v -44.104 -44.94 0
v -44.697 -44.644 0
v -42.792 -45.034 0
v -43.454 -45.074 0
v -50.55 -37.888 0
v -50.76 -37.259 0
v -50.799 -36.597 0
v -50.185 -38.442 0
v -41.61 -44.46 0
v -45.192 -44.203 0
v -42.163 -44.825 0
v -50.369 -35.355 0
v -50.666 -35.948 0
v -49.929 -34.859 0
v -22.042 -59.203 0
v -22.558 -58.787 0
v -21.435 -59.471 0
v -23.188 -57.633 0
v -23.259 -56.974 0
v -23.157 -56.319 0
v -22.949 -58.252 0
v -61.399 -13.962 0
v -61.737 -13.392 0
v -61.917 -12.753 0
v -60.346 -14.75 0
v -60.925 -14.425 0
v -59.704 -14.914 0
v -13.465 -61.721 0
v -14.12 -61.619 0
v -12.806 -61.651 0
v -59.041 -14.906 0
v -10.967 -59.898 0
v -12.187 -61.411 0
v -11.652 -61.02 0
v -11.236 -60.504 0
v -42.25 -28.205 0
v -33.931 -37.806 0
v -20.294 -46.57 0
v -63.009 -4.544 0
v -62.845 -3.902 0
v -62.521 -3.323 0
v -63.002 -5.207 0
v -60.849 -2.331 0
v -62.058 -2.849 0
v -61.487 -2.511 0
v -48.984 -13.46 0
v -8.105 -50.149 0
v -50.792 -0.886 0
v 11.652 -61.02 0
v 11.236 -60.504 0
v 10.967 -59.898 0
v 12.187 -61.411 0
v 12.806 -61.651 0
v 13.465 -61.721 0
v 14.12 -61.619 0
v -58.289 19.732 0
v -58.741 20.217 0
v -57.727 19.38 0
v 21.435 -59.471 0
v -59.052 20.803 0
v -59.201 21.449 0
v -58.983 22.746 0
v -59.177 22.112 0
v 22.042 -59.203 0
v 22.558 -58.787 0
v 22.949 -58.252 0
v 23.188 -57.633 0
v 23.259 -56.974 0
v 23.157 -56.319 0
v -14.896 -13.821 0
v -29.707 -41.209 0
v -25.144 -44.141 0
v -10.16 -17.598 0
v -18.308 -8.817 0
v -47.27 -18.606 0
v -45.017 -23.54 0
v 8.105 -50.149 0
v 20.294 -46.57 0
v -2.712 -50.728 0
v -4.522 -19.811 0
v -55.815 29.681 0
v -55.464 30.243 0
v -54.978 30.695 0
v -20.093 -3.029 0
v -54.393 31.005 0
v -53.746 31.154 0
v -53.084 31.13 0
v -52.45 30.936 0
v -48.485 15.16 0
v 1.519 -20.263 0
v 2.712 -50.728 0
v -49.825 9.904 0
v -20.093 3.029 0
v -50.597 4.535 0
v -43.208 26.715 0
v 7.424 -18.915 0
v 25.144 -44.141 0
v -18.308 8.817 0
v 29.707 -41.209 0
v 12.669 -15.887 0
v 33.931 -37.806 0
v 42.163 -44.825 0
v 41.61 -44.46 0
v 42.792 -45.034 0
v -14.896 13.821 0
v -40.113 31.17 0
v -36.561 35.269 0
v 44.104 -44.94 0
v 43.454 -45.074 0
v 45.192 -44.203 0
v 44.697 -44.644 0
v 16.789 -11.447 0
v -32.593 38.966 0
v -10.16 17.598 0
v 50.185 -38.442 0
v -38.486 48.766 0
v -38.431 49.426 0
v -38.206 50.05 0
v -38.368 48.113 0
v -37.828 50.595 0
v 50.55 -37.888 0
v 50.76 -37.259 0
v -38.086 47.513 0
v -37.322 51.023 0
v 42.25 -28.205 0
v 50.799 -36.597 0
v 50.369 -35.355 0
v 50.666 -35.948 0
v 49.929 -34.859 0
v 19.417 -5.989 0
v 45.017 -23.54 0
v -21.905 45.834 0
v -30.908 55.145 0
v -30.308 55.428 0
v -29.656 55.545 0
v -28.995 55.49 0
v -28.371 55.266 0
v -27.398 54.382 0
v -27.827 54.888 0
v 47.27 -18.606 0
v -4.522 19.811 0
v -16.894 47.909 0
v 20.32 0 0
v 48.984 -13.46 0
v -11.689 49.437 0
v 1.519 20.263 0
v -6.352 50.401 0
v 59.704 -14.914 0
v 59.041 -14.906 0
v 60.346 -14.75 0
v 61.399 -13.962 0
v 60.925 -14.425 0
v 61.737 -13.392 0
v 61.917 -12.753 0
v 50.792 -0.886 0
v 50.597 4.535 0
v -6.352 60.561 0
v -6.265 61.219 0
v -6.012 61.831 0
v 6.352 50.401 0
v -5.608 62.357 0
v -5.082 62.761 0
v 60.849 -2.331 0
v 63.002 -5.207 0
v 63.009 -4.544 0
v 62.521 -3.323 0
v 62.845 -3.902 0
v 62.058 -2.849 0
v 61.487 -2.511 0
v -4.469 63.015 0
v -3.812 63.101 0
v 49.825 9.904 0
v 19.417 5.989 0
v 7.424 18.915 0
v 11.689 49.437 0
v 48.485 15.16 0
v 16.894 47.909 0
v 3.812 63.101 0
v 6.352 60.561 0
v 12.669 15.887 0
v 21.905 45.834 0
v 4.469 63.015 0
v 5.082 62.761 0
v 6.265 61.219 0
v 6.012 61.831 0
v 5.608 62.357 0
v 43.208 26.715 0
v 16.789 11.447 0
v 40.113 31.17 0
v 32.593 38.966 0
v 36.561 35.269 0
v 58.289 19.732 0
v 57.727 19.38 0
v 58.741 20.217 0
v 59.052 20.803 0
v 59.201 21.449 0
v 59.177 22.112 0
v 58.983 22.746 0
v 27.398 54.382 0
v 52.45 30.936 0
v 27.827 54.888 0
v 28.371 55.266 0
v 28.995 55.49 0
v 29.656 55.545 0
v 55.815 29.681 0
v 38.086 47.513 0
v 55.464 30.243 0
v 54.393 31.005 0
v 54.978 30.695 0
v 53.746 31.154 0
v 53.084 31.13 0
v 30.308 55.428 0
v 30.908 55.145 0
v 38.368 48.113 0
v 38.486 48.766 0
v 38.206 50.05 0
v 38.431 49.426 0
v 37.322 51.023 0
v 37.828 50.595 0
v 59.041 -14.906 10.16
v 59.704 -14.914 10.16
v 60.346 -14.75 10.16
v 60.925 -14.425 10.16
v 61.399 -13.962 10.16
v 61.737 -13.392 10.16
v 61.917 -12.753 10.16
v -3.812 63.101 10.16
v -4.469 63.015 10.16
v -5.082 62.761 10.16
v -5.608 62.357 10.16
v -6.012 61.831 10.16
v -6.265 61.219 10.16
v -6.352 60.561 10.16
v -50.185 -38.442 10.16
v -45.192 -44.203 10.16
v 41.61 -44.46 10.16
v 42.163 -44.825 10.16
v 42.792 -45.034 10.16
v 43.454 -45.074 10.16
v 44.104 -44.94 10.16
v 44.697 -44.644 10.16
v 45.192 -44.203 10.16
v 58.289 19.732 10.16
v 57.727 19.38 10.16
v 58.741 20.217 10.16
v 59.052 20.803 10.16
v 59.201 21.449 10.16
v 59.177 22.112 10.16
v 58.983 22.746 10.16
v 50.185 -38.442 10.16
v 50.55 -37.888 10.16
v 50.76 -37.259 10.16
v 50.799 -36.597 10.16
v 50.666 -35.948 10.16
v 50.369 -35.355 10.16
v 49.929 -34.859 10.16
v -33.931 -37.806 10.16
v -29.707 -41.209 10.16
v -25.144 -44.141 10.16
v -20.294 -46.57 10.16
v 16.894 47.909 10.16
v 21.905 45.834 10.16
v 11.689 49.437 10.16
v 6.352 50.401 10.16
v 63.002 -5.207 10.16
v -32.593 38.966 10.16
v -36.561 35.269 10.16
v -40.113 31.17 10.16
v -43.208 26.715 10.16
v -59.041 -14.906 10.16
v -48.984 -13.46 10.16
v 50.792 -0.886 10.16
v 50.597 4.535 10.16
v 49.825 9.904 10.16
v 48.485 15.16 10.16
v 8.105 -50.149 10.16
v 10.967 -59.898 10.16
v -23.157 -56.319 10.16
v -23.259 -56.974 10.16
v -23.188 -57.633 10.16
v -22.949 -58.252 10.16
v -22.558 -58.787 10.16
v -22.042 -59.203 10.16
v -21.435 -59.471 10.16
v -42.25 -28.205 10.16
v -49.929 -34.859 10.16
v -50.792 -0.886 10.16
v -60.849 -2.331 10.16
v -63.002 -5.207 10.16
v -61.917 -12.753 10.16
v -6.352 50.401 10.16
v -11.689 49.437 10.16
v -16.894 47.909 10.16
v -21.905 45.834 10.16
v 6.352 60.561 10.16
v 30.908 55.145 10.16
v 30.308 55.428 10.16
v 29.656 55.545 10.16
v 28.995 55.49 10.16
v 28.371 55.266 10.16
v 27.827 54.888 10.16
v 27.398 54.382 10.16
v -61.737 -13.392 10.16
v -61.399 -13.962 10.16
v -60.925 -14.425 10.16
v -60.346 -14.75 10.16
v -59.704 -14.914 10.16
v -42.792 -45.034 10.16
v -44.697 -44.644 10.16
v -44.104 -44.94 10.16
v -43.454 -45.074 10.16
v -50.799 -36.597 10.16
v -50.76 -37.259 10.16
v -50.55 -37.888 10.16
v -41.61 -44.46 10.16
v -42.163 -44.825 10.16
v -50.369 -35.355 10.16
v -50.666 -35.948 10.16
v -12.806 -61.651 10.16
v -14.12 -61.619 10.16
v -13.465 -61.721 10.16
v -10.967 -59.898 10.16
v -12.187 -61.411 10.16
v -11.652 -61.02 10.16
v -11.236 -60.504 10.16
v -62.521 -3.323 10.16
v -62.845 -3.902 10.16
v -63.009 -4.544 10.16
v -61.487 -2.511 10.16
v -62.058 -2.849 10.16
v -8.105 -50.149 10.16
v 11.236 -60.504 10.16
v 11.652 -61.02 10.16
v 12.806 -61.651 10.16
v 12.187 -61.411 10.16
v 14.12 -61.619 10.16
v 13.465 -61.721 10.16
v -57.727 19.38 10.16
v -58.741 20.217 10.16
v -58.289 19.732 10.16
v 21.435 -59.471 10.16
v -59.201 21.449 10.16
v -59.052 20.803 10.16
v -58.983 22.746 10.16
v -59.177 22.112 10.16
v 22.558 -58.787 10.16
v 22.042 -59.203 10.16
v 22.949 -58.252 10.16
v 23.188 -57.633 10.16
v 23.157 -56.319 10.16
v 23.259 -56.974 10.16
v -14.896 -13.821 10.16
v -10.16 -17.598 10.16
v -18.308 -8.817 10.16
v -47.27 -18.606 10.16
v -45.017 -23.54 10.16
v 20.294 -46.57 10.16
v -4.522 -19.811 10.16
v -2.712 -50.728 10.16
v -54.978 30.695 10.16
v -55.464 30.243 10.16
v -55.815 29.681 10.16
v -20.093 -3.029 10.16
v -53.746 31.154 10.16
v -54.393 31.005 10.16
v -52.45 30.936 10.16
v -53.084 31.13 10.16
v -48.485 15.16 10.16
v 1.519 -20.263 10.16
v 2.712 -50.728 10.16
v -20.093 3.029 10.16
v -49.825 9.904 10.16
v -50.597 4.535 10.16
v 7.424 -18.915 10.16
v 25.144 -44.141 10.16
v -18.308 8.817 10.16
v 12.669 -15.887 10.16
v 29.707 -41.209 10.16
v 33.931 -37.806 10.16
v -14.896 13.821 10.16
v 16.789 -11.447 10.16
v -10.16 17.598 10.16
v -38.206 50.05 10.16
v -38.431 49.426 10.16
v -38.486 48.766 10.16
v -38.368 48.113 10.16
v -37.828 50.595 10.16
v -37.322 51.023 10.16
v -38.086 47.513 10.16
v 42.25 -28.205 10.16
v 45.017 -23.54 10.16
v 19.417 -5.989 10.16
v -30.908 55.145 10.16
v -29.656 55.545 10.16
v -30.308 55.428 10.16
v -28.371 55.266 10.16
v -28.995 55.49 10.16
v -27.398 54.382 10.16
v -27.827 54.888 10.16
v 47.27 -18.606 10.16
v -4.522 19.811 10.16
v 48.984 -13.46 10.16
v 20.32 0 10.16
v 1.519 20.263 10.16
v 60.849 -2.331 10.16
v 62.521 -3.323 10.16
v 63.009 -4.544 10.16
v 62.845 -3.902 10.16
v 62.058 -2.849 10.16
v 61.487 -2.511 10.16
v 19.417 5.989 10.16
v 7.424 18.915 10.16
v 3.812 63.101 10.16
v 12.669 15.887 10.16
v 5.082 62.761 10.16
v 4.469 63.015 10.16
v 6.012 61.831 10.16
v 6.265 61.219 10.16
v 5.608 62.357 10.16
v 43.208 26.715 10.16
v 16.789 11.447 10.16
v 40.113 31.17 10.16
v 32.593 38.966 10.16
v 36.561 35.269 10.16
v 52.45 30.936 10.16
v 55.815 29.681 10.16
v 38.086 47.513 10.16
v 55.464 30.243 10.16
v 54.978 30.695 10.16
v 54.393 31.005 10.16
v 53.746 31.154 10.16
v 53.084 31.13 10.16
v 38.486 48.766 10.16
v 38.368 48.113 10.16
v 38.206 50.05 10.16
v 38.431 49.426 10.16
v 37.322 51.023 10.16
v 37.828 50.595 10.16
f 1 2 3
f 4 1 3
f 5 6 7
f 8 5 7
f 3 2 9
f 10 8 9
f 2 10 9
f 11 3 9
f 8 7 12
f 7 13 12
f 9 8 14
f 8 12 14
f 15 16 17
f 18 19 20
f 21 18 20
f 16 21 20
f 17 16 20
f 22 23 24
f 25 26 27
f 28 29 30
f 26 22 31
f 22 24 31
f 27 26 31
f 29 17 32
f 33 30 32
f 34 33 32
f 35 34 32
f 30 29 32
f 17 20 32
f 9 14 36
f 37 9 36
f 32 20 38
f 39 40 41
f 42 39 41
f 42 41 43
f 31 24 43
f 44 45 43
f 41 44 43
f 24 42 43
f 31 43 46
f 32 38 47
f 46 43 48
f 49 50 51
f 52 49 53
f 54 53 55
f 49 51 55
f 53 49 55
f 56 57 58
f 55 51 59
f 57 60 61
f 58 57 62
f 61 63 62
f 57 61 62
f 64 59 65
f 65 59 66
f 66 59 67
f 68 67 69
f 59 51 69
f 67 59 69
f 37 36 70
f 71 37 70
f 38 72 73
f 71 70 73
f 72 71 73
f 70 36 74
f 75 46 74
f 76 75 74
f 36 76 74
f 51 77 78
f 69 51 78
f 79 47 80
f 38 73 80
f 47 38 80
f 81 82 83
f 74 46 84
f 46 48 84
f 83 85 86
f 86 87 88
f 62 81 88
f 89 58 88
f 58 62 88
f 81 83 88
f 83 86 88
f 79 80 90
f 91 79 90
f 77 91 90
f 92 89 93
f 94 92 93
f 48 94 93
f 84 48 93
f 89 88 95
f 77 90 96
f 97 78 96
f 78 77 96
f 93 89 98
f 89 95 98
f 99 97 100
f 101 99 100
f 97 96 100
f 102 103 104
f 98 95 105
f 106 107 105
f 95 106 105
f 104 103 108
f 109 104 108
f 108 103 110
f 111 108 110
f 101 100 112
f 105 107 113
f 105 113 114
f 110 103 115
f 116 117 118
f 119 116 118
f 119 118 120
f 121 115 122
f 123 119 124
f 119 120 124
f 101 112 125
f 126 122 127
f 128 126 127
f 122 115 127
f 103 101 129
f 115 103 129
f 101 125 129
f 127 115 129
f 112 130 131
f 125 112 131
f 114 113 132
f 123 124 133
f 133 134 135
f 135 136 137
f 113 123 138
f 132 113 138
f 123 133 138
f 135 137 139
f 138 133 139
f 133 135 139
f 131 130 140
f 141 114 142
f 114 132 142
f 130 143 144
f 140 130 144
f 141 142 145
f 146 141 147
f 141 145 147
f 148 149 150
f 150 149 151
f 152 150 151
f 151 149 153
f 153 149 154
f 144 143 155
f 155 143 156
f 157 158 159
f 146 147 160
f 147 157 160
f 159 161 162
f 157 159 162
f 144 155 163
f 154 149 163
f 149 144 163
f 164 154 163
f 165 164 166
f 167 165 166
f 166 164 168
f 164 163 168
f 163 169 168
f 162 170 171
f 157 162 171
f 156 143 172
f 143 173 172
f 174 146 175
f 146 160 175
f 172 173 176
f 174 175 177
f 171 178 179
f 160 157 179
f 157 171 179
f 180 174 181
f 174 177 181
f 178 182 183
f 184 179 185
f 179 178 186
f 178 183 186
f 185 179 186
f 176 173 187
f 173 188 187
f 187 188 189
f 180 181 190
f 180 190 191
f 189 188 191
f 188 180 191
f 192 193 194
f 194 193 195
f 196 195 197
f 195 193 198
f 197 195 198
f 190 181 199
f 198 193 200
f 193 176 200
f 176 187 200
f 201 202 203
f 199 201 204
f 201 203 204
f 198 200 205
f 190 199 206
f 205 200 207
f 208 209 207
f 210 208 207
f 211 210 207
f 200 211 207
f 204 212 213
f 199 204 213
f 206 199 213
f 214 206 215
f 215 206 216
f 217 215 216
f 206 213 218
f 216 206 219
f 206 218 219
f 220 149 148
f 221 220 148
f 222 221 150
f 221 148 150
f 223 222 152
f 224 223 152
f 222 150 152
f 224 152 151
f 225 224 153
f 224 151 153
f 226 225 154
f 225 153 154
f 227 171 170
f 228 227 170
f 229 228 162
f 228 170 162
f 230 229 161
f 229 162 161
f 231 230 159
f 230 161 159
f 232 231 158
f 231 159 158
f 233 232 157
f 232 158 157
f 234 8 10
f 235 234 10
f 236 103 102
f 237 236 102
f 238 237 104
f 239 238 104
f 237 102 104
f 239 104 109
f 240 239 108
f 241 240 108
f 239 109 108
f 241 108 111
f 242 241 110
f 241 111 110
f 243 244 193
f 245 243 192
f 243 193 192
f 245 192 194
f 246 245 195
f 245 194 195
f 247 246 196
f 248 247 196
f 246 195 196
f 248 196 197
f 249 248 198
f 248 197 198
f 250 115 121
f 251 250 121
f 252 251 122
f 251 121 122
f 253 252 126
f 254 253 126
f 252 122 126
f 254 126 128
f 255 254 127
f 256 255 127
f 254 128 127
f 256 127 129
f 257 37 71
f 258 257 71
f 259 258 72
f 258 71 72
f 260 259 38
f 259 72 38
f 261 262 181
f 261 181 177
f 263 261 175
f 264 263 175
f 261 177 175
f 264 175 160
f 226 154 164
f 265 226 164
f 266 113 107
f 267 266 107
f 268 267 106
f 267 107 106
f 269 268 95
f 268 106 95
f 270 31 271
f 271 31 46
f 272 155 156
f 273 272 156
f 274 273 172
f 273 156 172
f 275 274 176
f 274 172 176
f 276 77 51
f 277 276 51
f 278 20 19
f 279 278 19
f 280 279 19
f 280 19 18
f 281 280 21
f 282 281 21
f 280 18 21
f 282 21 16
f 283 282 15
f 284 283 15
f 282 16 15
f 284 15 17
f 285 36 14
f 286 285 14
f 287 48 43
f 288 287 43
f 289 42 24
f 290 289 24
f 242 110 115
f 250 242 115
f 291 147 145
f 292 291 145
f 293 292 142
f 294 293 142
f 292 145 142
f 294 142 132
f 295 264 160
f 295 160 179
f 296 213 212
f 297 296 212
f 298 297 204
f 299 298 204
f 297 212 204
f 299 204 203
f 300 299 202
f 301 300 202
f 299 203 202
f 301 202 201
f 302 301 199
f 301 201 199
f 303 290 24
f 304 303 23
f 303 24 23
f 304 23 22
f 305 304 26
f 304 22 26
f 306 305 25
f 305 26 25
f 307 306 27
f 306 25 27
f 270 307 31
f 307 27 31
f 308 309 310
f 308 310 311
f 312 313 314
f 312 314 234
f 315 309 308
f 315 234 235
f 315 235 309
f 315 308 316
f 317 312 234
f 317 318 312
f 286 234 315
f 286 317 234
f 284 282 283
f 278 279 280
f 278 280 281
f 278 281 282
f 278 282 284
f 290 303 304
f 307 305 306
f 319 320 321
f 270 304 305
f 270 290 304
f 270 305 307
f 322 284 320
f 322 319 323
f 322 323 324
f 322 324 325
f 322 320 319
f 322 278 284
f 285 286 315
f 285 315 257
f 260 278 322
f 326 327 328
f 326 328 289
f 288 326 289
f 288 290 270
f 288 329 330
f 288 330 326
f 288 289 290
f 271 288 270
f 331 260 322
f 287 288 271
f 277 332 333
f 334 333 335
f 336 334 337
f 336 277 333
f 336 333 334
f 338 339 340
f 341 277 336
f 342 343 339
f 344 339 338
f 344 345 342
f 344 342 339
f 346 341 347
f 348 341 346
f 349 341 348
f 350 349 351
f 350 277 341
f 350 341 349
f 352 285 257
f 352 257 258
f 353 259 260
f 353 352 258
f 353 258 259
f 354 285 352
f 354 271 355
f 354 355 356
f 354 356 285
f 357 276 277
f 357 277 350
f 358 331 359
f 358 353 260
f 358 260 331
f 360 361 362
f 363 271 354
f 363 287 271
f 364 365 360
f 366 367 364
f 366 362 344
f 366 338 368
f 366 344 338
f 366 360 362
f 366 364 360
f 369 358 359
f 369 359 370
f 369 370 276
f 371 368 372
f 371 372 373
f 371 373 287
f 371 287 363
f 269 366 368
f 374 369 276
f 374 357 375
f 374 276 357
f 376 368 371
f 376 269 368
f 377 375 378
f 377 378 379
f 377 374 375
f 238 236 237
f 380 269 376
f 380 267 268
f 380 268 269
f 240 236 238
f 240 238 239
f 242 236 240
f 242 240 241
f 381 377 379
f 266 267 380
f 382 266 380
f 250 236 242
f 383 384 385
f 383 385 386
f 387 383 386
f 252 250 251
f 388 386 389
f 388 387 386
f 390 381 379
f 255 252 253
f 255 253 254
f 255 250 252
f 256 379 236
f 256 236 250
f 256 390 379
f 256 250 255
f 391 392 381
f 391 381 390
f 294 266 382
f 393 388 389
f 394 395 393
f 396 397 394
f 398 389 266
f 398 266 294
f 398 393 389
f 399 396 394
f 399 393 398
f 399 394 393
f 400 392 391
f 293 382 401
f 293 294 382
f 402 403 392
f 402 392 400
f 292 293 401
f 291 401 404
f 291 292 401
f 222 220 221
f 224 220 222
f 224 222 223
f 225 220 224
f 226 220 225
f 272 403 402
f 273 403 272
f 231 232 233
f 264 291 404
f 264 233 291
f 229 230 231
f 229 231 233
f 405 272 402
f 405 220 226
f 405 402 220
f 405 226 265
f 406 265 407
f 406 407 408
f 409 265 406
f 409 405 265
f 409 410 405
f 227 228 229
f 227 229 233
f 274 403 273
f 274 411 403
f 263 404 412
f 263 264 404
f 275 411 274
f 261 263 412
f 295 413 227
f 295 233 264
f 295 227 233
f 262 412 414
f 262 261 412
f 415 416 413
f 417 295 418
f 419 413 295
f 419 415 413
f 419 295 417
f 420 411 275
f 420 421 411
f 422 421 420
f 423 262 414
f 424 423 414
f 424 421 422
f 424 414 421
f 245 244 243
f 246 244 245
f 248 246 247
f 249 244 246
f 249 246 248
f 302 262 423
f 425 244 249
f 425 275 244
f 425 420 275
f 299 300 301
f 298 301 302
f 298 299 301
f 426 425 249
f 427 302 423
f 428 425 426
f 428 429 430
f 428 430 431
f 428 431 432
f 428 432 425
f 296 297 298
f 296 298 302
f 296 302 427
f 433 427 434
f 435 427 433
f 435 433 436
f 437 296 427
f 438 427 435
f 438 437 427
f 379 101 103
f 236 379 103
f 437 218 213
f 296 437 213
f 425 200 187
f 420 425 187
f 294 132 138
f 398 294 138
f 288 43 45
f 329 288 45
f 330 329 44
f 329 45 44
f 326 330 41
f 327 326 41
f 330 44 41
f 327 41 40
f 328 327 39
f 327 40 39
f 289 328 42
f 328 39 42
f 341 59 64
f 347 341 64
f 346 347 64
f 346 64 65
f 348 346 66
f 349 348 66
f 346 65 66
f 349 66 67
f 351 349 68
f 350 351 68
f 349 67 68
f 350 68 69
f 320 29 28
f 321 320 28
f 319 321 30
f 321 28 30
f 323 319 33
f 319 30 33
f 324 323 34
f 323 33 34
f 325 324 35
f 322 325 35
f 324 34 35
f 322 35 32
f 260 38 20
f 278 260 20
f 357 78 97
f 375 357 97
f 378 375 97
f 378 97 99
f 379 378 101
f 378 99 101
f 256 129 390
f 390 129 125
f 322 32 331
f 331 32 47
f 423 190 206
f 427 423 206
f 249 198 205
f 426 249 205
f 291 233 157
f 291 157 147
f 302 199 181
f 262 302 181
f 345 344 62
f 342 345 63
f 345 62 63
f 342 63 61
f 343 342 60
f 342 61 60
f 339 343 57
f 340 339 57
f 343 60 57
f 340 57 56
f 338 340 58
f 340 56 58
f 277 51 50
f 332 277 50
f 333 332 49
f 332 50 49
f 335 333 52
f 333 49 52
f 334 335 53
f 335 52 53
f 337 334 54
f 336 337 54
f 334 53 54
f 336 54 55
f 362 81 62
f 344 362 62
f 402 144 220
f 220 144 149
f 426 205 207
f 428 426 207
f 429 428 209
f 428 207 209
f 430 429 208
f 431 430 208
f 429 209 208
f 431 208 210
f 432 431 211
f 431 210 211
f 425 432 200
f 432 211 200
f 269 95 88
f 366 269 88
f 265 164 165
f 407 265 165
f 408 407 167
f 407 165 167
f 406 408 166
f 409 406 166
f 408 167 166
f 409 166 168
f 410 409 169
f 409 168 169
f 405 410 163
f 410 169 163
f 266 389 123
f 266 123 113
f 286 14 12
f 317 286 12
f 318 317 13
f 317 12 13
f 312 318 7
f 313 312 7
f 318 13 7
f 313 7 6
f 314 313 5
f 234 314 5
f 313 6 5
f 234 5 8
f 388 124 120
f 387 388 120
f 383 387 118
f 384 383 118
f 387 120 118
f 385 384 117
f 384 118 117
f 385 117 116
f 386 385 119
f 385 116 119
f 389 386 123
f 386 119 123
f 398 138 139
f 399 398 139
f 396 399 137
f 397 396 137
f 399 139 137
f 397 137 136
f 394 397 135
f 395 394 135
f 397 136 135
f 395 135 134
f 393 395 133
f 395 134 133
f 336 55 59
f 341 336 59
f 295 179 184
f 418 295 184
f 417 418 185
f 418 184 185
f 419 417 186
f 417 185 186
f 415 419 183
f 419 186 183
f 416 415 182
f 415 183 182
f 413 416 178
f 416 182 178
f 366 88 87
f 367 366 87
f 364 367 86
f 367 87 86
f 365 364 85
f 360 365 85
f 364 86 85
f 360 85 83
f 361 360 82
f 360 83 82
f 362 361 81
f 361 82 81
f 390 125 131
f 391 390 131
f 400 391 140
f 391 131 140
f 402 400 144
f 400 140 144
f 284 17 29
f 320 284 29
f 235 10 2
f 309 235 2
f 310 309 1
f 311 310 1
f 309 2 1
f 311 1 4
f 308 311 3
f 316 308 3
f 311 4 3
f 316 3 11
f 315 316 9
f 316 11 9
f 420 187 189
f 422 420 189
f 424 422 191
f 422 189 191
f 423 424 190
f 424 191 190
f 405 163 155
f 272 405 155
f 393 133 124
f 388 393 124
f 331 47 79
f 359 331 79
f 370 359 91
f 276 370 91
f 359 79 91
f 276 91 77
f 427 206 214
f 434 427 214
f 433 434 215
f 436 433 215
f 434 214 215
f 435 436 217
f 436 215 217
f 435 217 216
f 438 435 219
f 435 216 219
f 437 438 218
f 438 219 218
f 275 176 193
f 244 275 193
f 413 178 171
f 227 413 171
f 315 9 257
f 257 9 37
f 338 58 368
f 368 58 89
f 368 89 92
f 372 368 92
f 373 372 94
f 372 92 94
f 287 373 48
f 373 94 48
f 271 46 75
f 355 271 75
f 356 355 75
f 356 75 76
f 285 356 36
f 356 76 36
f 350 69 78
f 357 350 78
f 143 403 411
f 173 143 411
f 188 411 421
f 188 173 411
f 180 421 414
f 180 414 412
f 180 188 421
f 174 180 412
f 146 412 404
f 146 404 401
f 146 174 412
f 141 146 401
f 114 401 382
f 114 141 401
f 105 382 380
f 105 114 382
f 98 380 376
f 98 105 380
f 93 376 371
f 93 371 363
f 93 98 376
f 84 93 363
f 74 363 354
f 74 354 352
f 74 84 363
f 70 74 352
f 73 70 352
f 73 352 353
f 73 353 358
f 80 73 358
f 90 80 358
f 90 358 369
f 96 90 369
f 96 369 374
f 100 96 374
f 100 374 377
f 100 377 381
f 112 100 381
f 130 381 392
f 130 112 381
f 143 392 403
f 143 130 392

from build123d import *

# Parameters (mm, degrees)
SKETCH1_R           = 20.32
BOSS_EXTRUDE3_DEPTH = 10.16


with BuildPart() as part:
    # Sketch1 → Boss-Extrude3 (new body)
    with BuildSketch(Plane.XY):
        with BuildLine():
            Line((37.321963159, 51.023310491), (30.908331921, 55.145101009))
            ThreePointArc((30.908331921, 55.145101009), (28.995188409, 55.490270076), (27.398320271, 54.381544712))
            Line((27.398320271, 54.381544712), (21.905409565, 45.834408819))
            ThreePointArc((21.905409565, 45.834408819), (14.312013888, 48.74224306), (6.351949066, 50.401316878))
            Line((6.351949066, 50.401316878), (6.351949066, 60.561316878))
            ThreePointArc((6.351949066, 60.561316878), (5.608000291, 62.357368102), (3.811949066, 63.101316878))
            Line((3.811949066, 63.101316878), (-3.811949066, 63.101316878))
            ThreePointArc((-3.811949066, 63.101316878), (-5.608000291, 62.357368102), (-6.351949066, 60.561316878))
            Line((-6.351949066, 60.561316878), (-6.351949066, 50.401316878))
            ThreePointArc((-6.351949066, 50.401316878), (-14.312013888, 48.74224306), (-21.905409565, 45.834408819))
            Line((-21.905409565, 45.834408819), (-27.398320271, 54.381544712))
            ThreePointArc((-27.398320271, 54.381544712), (-28.995188409, 55.490270076), (-30.908331921, 55.145101009))
            Line((-30.908331921, 55.145101009), (-37.321963159, 51.023310491))
            ThreePointArc((-37.321963159, 51.023310491), (-38.430688522, 49.426442353), (-38.085519456, 47.513298841))
            Line((-38.085519456, 47.513298841), (-32.59260875, 38.966162948))
            ThreePointArc((-32.59260875, 38.966162948), (-38.392078377, 33.266925284), (-43.207955436, 26.71539981))
            Line((-43.207955436, 26.71539981), (-52.449816509, 30.936016342))
            ThreePointArc((-52.449816509, 30.936016342), (-54.392609658, 31.005403375), (-55.81543591, 29.680705207))
            Line((-55.81543591, 29.680705207), (-58.982517652, 22.745763536))
            ThreePointArc((-58.982517652, 22.745763536), (-59.051904686, 20.802970387), (-57.727206517, 19.380144135))
            Line((-57.727206517, 19.380144135), (-48.485345444, 15.159527603))
            ThreePointArc((-48.485345444, 15.159527603), (-50.282929248, 7.229593784), (-50.792280749, -0.885559877))
            Line((-50.792280749, -0.885559877), (-60.848866599, -2.331478634))
            ThreePointArc((-60.848866599, -2.331478634), (-62.520761661, -3.323459823), (-63.001533372, -5.207104785))
            Line((-63.001533372, -5.207104785), (-61.916539542, -12.753402628))
            ThreePointArc((-61.916539542, -12.753402628), (-60.924558353, -14.42529769), (-59.040913391, -14.906069401))
            Line((-59.040913391, -14.906069401), (-48.984327541, -13.460150644))
            ThreePointArc((-48.984327541, -13.460150644), (-46.209305364, -21.10308266), (-42.250415805, -28.20536056))
            Line((-42.250415805, -28.20536056), (-49.928831481, -34.858745616))
            ThreePointArc((-49.928831481, -34.858745616), (-50.799013587, -36.59714801), (-50.185089135, -38.441695799))
            Line((-50.185089135, -38.441695799), (-45.192497609, -44.203453568))
            ThreePointArc((-45.192497609, -44.203453568), (-43.454095215, -45.073635675), (-41.609547426, -44.459711223))
            Line((-41.609547426, -44.459711223), (-33.93113175, -37.806326166))
            ThreePointArc((-33.93113175, -37.806326166), (-27.464553527, -42.735679468), (-20.29434237, -46.570158554))
            Line((-20.29434237, -46.570158554), (-23.156745148, -56.318607166))
            ThreePointArc((-23.156745148, -56.318607166), (-22.948937628, -58.251500287), (-21.435233689, -59.471320013))
            Line((-21.435233689, -59.471320013), (-14.120156999, -61.619220327))
            ThreePointArc((-14.120156999, -61.619220327), (-12.187263879, -61.411412808), (-10.967444152, -59.897708869))
            Line((-10.967444152, -59.897708869), (-8.105041374, -50.149260257))
            ThreePointArc((-8.105041374, -50.149260257), (0, -50.8), (8.105041374, -50.149260257))
            Line((8.105041374, -50.149260257), (10.967444152, -59.897708869))
            ThreePointArc((10.967444152, -59.897708869), (12.187263879, -61.411412808), (14.120156999, -61.619220327))
            Line((14.120156999, -61.619220327), (21.435233689, -59.471320013))
            ThreePointArc((21.435233689, -59.471320013), (22.948937628, -58.251500287), (23.156745148, -56.318607166))
            Line((23.156745148, -56.318607166), (20.29434237, -46.570158554))
            ThreePointArc((20.29434237, -46.570158554), (27.464553527, -42.735679468), (33.93113175, -37.806326166))
            Line((33.93113175, -37.806326166), (41.609547426, -44.459711223))
            ThreePointArc((41.609547426, -44.459711223), (43.454095215, -45.073635675), (45.192497609, -44.203453568))
            Line((45.192497609, -44.203453568), (50.185089135, -38.441695799))
            ThreePointArc((50.185089135, -38.441695799), (50.799013587, -36.59714801), (49.928831481, -34.858745616))
            Line((49.928831481, -34.858745616), (42.250415805, -28.205360559))
            ThreePointArc((42.250415805, -28.205360559), (46.209305364, -21.10308266), (48.984327541, -13.460150644))
            Line((48.984327541, -13.460150644), (59.040913391, -14.906069401))
            ThreePointArc((59.040913391, -14.906069401), (60.924558353, -14.42529769), (61.916539542, -12.753402628))
            Line((61.916539542, -12.753402628), (63.001533372, -5.207104785))
            ThreePointArc((63.001533372, -5.207104785), (62.520761661, -3.323459823), (60.848866599, -2.331478634))
            Line((60.848866599, -2.331478634), (50.792280749, -0.885559877))
            ThreePointArc((50.792280749, -0.885559877), (50.282929248, 7.229593784), (48.485345444, 15.159527603))
            Line((48.485345444, 15.159527603), (57.727206517, 19.380144135))
            ThreePointArc((57.727206517, 19.380144135), (59.051904686, 20.802970387), (58.982517652, 22.745763536))
            Line((58.982517652, 22.745763536), (55.81543591, 29.680705207))
            ThreePointArc((55.81543591, 29.680705207), (54.392609658, 31.005403375), (52.449816509, 30.936016342))
            Line((52.449816509, 30.936016342), (43.207955436, 26.71539981))
            ThreePointArc((43.207955436, 26.71539981), (38.392078377, 33.266925284), (32.59260875, 38.966162948))
            Line((32.59260875, 38.966162948), (38.085519456, 47.513298841))
            ThreePointArc((38.085519456, 47.513298841), (38.430688522, 49.426442353), (37.321963159, 51.023310491))
        make_face()
        Circle(SKETCH1_R, mode=Mode.SUBTRACT)
    extrude(amount=BOSS_EXTRUDE3_DEPTH)


solid = part.part
